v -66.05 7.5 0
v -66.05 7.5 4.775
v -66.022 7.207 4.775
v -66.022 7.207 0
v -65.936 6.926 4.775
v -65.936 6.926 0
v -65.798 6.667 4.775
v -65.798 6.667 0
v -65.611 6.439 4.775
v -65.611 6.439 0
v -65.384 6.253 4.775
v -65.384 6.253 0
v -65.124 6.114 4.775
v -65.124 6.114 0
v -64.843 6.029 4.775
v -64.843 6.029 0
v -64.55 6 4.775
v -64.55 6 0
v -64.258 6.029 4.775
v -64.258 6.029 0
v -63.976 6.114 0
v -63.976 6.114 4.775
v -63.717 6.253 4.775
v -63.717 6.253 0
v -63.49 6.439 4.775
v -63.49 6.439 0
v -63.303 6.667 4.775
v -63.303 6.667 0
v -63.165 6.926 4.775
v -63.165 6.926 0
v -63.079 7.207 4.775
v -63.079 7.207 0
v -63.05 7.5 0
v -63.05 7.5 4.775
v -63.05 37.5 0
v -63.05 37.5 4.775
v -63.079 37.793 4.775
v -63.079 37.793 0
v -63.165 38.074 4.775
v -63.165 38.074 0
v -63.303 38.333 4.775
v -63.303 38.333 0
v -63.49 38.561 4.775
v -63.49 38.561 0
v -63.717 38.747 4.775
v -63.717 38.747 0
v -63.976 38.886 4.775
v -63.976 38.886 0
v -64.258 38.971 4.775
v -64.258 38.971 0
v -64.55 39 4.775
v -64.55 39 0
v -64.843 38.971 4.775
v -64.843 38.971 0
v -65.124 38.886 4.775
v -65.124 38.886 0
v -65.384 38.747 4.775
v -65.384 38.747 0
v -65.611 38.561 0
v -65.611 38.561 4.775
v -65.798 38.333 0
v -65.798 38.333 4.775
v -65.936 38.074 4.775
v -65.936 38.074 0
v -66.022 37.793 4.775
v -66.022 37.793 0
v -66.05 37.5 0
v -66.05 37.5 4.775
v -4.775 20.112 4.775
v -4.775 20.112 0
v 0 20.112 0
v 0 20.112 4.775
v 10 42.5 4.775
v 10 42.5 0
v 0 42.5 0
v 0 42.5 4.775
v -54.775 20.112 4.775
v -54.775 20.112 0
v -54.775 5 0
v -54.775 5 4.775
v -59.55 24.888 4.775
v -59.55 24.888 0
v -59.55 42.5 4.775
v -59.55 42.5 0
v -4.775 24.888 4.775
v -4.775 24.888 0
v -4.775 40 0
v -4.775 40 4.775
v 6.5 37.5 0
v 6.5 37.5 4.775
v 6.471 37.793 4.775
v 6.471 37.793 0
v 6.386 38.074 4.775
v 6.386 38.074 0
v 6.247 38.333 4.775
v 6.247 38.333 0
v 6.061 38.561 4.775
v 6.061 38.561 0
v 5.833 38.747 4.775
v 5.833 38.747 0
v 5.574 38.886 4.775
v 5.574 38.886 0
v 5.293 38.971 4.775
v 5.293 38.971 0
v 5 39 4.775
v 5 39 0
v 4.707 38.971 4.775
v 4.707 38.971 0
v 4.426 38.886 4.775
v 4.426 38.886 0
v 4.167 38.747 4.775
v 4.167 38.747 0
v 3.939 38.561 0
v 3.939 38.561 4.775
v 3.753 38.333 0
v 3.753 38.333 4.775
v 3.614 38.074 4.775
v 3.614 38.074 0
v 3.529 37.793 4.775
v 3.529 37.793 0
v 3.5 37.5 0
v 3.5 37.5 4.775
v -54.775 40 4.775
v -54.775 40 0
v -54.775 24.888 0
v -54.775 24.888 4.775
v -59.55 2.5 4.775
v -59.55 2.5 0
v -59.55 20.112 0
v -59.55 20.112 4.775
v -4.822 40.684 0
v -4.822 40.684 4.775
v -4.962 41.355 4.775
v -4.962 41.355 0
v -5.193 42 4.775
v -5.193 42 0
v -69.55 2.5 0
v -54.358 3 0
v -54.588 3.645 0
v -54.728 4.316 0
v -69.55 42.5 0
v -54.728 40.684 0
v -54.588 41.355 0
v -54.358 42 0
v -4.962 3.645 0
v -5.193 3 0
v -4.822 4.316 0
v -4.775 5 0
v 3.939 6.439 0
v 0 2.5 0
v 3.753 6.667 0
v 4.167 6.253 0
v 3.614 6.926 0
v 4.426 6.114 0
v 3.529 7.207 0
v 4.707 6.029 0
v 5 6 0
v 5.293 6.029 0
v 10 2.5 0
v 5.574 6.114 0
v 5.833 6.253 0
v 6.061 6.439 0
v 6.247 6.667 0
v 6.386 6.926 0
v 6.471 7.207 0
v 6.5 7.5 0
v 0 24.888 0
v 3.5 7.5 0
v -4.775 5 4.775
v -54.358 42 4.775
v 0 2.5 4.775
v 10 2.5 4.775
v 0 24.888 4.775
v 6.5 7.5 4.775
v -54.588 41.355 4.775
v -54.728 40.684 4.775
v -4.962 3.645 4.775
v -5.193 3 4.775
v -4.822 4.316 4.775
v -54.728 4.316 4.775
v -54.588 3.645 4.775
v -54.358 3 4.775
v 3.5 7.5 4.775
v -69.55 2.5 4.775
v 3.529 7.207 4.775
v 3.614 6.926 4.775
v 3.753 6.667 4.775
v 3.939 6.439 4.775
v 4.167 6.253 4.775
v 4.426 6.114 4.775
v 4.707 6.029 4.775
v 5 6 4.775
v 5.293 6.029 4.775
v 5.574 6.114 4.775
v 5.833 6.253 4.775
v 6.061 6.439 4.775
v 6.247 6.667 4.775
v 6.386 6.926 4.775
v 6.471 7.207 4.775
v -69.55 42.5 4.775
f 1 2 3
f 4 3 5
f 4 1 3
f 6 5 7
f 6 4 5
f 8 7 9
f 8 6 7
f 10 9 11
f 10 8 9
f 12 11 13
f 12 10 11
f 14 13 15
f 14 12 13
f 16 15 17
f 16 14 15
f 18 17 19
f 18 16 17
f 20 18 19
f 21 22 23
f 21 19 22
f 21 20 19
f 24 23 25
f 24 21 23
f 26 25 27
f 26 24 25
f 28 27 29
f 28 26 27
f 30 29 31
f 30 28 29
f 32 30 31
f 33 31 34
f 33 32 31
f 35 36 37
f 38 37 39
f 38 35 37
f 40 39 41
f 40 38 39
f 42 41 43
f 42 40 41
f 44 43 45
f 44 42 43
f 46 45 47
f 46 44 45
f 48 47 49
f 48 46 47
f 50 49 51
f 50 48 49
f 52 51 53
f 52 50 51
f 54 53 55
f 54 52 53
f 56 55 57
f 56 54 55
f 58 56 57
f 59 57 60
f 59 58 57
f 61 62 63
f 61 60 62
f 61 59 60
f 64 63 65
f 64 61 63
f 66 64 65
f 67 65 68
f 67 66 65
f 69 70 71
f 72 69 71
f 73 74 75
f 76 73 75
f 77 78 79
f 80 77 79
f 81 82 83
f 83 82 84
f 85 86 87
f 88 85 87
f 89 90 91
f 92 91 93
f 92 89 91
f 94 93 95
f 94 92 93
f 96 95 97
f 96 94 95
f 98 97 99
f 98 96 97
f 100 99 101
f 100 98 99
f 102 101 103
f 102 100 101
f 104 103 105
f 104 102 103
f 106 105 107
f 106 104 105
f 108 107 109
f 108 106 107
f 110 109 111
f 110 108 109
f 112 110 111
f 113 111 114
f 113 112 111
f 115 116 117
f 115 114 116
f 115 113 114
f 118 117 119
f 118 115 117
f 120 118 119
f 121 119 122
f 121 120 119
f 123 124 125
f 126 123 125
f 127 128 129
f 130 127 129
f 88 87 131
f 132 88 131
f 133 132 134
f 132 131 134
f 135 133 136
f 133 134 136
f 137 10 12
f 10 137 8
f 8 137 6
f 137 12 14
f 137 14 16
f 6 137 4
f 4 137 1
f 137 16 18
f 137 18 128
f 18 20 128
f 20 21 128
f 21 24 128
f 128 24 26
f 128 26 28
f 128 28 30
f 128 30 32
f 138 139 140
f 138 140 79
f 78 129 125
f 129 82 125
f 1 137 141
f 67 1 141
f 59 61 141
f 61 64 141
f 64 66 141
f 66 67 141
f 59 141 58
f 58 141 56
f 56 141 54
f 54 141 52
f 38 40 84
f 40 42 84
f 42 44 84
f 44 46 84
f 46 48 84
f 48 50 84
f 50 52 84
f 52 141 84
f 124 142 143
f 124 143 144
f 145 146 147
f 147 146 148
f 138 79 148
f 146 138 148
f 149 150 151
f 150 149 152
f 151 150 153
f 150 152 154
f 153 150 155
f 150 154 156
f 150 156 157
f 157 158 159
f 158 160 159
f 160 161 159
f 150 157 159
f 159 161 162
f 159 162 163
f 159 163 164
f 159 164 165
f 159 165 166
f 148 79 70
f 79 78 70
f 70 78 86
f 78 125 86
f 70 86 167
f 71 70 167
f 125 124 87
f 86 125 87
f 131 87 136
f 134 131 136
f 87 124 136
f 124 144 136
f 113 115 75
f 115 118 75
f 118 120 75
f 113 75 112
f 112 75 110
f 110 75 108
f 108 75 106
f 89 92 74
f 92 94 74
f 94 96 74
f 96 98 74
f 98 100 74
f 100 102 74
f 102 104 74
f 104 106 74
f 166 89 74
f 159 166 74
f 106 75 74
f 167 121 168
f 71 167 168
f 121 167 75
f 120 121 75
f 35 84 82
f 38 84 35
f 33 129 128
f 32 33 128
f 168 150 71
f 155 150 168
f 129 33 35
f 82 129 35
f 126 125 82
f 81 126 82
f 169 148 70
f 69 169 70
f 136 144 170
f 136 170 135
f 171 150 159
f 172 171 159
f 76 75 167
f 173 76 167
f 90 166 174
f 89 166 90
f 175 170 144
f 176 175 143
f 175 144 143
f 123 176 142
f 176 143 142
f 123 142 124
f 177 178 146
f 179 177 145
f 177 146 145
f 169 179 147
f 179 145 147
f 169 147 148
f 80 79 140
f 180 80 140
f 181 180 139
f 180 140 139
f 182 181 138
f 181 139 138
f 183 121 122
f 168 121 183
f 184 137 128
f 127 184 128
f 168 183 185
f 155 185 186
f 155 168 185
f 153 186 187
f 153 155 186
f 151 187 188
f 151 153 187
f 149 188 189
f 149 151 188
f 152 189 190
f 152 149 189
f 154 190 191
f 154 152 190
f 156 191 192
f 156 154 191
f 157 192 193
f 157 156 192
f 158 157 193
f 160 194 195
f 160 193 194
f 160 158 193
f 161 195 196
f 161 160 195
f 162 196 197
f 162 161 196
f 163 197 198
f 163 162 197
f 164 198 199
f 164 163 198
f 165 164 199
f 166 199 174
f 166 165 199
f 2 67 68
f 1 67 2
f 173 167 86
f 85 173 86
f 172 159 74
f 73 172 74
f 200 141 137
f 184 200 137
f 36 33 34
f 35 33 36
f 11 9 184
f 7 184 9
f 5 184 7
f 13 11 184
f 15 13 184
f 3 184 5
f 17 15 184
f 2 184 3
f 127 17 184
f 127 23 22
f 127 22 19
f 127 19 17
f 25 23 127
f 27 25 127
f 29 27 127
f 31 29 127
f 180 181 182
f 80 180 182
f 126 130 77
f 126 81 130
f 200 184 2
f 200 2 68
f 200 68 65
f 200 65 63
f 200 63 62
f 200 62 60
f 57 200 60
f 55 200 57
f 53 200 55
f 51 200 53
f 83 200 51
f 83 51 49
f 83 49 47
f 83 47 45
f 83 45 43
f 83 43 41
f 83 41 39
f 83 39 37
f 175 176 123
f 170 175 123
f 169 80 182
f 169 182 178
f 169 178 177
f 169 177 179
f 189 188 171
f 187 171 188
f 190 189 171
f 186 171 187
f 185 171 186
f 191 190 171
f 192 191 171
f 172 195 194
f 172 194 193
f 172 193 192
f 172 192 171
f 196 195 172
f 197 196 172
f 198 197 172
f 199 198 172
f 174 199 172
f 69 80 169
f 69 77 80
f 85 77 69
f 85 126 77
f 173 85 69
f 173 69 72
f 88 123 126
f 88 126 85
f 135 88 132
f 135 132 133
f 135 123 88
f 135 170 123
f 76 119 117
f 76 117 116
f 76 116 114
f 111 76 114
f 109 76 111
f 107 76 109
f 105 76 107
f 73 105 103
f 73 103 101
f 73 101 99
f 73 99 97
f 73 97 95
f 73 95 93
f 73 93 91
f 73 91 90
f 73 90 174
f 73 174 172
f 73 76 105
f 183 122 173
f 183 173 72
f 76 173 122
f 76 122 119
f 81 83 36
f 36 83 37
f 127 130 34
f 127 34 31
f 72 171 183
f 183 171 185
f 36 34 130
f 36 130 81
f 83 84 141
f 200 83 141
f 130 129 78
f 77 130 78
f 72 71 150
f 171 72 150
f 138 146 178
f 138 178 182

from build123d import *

# Parameters (mm, degrees)
BOSS_EXTRUDE1_DEPTH = 4.7752
CUT_EXTRUDE1_DEPTH  = 83.976265734
CUT_EXTRUDE2_DEPTH  = 10


with BuildPart() as part:
    # Sketch1 → Boss-Extrude1 (new body)
    with BuildSketch(Plane.XY):
        with BuildLine():
            Line((0, 24.8876), (-4.7752, 24.8876))
            Line((-4.7752, 24.8876), (-4.7752, 40))
            ThreePointArc((-4.7752, 40), (-6.239666094, 43.535533906), (-9.7752, 45))
            Line((-9.7752, 45), (-49.7752, 45))
            ThreePointArc((-49.7752, 45), (-53.310733906, 43.535533906), (-54.7752, 40))
            Line((-54.7752, 40), (-54.7752, 24.8876))
            Line((-54.7752, 24.8876), (-59.5504, 24.8876))
            Line((-59.5504, 24.8876), (-59.5504, 42.5))
            Line((-59.5504, 42.5), (-69.5504, 42.5))
            Line((-69.5504, 42.5), (-69.5504, 2.5))
            Line((-69.5504, 2.5), (-59.5504, 2.5))
            Line((-59.5504, 2.5), (-59.5504, 20.1124))
            Line((-59.5504, 20.1124), (-54.7752, 20.1124))
            Line((-54.7752, 20.1124), (-54.7752, 5))
            ThreePointArc((-54.7752, 5), (-53.310733906, 1.464466094), (-49.7752, 0))
            Line((-49.7752, 0), (-9.7752, 0))
            ThreePointArc((-9.7752, 0), (-6.239666094, 1.464466094), (-4.7752, 5))
            Line((-4.7752, 5), (-4.7752, 20.1124))
            Line((-4.7752, 20.1124), (0, 20.1124))
            Line((0, 20.1124), (0, 2.5))
            Line((0, 2.5), (10, 2.5))
            Line((10, 2.5), (10, 42.5))
            Line((10, 42.5), (0, 42.5))
            Line((0, 42.5), (0, 24.8876))
        make_face()
    extrude(amount=BOSS_EXTRUDE1_DEPTH)

    # Sketch1<3> → Cut-Extrude1 (cut, through all)
    with BuildSketch(Plane.XY):
        with BuildLine():
            Line((-63.0504, 7.5), (-63.0504, 37.5))
            ThreePointArc((-63.0504, 37.5), (-64.5504, 39), (-66.0504, 37.5))
            Line((-66.0504, 37.5), (-66.0504, 7.5))
            ThreePointArc((-66.0504, 7.5), (-64.5504, 6), (-63.0504, 7.5))
        make_face()
        with BuildLine():
            Line((6.5, 7.5), (6.5, 37.5))
            ThreePointArc((6.5, 37.5), (5, 39), (3.5, 37.5))
            Line((3.5, 37.5), (3.5, 7.5))
            ThreePointArc((3.5, 7.5), (5, 6), (6.5, 7.5))
        make_face()
    extrude(amount=CUT_EXTRUDE1_DEPTH, mode=Mode.SUBTRACT)

    # Sketch1<5> → Cut-Extrude2 (cut)
    with BuildSketch(Plane.XY):
        with BuildLine():
            ThreePointArc((-5.192624305, 42), (-7.036587212, 44.183300133), (-9.7752, 45))
            Line((-9.7752, 45), (-49.7752, 45))
            ThreePointArc((-49.7752, 45), (-52.513812788, 44.183300133), (-54.357775695, 42))
            Line((-54.357775695, 42), (-5.192624305, 42))
        make_face()
        with BuildLine():
            ThreePointArc((-9.7752, 0), (-7.036587212, 0.816699867), (-5.192624305, 3))
            Line((-5.192624305, 3), (-54.357775695, 3))
            ThreePointArc((-54.357775695, 3), (-52.513812788, 0.816699867), (-49.7752, 0))
            Line((-49.7752, 0), (-9.7752, 0))
        make_face()
    extrude(amount=CUT_EXTRUDE2_DEPTH, mode=Mode.SUBTRACT)


solid = part.part
